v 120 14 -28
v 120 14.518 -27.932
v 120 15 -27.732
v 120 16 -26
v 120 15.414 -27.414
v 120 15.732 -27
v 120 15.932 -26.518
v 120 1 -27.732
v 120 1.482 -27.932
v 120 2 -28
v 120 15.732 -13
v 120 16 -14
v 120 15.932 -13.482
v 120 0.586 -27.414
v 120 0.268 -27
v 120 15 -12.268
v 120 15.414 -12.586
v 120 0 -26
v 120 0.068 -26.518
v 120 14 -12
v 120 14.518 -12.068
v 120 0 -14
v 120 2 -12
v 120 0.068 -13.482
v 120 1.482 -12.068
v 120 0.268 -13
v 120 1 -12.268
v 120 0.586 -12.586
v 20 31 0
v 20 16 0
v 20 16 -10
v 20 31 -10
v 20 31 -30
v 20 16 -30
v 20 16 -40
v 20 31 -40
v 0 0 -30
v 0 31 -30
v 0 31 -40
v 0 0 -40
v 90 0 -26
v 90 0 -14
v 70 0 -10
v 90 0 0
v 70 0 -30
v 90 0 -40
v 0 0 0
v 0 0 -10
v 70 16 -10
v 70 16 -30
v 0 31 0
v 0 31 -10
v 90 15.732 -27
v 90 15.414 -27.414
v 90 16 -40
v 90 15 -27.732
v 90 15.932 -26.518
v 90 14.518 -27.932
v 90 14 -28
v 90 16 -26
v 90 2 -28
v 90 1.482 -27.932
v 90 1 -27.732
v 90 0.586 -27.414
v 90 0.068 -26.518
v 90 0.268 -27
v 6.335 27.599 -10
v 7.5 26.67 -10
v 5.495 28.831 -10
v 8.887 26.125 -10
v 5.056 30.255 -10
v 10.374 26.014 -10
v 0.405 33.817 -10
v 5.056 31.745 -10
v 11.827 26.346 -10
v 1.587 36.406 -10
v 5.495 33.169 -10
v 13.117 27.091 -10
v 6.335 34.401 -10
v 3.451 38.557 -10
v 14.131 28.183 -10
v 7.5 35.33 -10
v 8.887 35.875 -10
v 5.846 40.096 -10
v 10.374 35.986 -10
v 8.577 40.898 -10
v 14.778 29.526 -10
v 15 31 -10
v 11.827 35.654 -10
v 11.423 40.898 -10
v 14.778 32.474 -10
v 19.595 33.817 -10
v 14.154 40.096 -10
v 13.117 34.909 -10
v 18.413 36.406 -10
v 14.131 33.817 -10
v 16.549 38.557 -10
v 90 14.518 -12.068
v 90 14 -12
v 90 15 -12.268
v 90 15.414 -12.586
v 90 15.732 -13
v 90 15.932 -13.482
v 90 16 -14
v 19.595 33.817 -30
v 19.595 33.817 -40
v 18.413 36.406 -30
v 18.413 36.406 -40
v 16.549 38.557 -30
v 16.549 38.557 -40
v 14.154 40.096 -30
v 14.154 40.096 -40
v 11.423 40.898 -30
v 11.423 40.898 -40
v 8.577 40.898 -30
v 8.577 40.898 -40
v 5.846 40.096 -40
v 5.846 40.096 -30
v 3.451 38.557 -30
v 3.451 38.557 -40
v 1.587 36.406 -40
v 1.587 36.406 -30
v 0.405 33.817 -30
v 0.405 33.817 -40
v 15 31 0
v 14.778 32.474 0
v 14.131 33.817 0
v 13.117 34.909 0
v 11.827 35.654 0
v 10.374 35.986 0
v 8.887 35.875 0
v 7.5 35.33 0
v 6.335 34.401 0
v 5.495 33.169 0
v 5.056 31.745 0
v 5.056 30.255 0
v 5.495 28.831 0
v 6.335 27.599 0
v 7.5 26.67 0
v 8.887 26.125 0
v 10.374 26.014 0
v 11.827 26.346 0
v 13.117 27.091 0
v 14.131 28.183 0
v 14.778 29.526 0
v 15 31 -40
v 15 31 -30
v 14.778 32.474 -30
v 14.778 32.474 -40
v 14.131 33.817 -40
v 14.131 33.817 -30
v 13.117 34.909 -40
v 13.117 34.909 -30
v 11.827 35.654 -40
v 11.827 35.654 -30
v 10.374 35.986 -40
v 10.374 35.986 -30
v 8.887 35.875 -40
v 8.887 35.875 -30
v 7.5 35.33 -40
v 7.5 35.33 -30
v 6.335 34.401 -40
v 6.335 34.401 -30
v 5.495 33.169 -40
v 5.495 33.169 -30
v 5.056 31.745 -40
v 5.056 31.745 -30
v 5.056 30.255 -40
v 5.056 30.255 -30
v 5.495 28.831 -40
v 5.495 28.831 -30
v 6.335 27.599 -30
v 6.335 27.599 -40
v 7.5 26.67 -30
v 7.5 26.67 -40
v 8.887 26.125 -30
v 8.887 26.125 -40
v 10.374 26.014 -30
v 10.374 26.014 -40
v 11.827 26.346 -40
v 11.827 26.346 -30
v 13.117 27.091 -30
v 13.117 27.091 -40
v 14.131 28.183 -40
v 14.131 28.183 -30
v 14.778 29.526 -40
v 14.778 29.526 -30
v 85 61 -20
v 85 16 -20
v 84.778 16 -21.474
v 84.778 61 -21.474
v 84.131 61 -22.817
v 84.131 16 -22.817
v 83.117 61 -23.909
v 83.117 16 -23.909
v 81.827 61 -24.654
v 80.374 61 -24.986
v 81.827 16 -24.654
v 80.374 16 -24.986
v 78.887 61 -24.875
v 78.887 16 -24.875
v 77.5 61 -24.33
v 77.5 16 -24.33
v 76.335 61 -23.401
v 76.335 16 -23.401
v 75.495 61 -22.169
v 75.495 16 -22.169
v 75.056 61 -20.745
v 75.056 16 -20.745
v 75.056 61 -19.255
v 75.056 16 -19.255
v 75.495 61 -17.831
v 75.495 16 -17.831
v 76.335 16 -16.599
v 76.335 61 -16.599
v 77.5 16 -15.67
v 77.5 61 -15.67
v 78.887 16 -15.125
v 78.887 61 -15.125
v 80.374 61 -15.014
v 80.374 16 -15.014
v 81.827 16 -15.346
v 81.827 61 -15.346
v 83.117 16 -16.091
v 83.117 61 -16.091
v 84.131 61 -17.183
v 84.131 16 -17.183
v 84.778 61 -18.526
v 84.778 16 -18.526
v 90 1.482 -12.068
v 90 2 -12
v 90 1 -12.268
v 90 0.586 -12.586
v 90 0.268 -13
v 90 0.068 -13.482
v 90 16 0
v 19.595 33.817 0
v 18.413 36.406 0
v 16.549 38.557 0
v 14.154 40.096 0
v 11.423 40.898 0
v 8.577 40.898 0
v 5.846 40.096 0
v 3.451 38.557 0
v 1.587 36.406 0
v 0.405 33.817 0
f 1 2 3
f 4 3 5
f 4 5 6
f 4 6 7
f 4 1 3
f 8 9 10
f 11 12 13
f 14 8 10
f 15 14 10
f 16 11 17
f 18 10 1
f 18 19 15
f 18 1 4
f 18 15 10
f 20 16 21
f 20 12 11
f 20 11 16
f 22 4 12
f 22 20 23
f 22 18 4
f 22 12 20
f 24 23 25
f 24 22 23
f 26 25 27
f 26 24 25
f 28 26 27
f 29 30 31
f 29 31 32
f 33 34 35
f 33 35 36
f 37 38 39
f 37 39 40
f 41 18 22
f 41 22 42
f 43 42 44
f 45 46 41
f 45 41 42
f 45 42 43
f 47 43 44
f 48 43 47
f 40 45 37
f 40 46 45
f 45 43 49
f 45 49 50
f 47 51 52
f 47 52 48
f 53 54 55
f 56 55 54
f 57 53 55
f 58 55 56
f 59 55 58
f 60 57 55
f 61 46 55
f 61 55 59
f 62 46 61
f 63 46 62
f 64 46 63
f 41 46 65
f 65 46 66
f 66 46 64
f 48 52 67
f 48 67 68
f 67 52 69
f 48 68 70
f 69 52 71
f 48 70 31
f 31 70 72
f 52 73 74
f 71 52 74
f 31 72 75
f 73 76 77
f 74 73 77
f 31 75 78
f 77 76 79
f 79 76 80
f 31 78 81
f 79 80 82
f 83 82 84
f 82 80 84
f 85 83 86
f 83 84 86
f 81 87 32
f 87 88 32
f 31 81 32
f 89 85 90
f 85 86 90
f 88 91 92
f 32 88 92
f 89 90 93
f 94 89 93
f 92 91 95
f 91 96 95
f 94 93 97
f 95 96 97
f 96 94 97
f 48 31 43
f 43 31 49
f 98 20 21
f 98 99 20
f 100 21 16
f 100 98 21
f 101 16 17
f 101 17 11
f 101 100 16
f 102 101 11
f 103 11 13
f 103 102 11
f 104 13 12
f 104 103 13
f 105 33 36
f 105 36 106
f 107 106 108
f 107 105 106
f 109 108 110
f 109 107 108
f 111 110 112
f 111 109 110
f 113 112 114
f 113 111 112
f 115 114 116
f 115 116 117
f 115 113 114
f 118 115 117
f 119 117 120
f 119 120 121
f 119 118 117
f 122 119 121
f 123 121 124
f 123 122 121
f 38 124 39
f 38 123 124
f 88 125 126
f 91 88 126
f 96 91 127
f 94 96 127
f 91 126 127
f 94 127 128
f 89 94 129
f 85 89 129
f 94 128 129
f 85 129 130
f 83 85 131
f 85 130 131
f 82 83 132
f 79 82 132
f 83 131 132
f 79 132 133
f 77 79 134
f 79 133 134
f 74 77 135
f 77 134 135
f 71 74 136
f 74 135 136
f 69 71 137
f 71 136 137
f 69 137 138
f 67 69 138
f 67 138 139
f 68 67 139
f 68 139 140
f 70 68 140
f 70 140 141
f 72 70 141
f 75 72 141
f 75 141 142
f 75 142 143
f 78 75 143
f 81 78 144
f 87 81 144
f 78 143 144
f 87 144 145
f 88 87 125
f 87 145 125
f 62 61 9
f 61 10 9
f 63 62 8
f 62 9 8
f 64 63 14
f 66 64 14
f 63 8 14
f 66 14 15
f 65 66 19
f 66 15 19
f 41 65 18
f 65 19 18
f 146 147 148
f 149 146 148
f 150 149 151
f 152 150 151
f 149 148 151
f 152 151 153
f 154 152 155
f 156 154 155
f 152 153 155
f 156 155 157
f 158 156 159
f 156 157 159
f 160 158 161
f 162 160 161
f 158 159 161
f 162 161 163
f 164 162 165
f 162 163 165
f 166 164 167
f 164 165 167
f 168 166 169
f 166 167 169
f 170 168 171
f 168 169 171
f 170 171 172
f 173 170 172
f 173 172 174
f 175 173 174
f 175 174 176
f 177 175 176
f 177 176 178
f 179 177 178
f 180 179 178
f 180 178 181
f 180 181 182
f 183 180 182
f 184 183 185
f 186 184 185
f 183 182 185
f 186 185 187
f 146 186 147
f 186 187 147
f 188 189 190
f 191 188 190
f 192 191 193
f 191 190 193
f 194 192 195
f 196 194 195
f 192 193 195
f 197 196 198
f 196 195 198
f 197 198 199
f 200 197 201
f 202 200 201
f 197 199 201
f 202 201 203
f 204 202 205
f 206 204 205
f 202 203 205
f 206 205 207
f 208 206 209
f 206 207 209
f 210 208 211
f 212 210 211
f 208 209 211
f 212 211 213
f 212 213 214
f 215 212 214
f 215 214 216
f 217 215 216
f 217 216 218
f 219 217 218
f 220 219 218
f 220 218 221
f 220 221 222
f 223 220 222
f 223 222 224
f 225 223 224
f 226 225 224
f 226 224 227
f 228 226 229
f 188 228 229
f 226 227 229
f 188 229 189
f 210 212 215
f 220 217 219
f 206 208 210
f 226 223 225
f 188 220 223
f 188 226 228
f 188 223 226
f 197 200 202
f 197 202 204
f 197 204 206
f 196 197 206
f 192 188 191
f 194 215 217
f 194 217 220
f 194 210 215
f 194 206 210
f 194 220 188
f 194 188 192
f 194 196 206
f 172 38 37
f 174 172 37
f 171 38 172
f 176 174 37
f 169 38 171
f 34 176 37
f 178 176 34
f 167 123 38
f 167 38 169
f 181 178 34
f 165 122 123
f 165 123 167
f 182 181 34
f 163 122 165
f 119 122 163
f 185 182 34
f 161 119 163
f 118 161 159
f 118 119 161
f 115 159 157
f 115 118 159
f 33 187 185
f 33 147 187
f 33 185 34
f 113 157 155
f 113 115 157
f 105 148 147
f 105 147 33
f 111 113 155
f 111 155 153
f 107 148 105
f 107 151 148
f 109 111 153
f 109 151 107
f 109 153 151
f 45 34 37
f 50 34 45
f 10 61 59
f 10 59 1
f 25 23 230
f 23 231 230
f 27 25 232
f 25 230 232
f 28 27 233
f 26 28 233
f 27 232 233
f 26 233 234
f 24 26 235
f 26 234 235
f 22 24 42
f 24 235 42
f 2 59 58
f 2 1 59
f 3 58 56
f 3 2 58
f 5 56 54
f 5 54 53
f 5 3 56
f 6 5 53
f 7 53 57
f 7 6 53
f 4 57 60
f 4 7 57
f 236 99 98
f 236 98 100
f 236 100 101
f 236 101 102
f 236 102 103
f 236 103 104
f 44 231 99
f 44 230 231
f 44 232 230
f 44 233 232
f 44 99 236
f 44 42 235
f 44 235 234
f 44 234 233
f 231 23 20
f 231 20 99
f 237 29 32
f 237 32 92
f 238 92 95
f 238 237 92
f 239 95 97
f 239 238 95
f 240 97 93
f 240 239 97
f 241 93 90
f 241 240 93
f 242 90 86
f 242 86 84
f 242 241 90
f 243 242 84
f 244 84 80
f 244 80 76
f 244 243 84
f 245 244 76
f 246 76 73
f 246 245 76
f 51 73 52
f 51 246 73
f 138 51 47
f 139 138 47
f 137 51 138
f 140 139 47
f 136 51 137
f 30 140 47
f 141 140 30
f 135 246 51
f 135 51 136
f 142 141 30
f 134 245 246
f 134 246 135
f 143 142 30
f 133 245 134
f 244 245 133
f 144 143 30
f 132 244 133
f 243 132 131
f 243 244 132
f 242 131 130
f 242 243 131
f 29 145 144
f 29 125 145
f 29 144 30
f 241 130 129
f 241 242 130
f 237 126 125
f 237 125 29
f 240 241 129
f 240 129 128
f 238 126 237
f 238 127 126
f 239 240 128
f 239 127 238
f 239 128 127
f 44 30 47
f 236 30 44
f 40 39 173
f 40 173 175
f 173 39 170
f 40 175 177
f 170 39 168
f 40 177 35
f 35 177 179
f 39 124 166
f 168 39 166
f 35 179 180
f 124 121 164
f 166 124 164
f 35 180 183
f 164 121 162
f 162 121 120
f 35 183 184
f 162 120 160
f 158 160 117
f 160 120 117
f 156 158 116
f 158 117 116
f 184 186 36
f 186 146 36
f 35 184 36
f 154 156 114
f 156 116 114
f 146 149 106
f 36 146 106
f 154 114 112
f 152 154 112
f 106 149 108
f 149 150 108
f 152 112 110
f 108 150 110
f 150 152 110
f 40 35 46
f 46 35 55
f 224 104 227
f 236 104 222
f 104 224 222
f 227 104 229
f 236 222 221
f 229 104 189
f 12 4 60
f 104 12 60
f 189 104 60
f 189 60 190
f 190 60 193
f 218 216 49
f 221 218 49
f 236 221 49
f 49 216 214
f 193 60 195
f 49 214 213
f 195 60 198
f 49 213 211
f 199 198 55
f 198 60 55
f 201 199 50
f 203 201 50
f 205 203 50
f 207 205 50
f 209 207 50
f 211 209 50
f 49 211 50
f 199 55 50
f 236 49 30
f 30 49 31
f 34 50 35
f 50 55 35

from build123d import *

# Parameters (mm, degrees)
BOSS_EXTRUDE1_DEPTH = 16
FILLET1_R           = 2
SKETCH3_R           = 5
BOSS_EXTRUDE2_DEPTH = 10
LPATTERN1_COUNT     = 2
LPATTERN1_PITCH     = 30
SKETCH4_R           = 5
BOSS_EXTRUDE3_DEPTH = 45


with BuildPart() as part:
    # Sketch2 → Boss-Extrude1 (new body)
    with BuildSketch(Plane(origin=(0, 0, 0), x_dir=(1, 0, 0), z_dir=(0, 1, 0))):
        Polygon((0, 30), (0, 40), (90, 40), (90, 28), (120, 28), (120, 12), (90, 12), (90, 0), (0, 0), (0, 10), (70, 10), (70, 30), align=None)
    extrude(amount=BOSS_EXTRUDE1_DEPTH)

    # Fillet1
    fillet1_edges = [part.edges().sort_by_distance(p)[0] for p in [
        (105, 16, -12),
        (105, 0, -28),
        (105, 0, -12),
        (105, 16, -28),
    ]]
    fillet(fillet1_edges, radius=FILLET1_R)

    # Sketch3 → Boss-Extrude2 (add)
    with BuildSketch(Plane.XY):
        with BuildLine():
            Line((0, 16), (20, 16))
            Line((20, 16), (20, 31))
            ThreePointArc((20, 31), (10, 41), (0, 31))
            Line((0, 31), (0, 16))
        make_face()
        with Locations((10, 31)):
            Circle(SKETCH3_R, mode=Mode.SUBTRACT)
    boss_extrude2 = extrude(amount=-BOSS_EXTRUDE2_DEPTH)

    # LPattern1: Boss-Extrude2 ×2
    with Locations(*[(0, 0, -i * LPATTERN1_PITCH) for i in range(1, LPATTERN1_COUNT)]):
        add(boss_extrude2)

    # Sketch4 → Boss-Extrude3 (add)
    with BuildSketch(Plane(origin=(0, 16, 0), x_dir=(1, 0, 0), z_dir=(0, 1, 0))):
        with Locations((80, 20)):
            Circle(SKETCH4_R)
    extrude(amount=BOSS_EXTRUDE3_DEPTH)


solid = part.part
